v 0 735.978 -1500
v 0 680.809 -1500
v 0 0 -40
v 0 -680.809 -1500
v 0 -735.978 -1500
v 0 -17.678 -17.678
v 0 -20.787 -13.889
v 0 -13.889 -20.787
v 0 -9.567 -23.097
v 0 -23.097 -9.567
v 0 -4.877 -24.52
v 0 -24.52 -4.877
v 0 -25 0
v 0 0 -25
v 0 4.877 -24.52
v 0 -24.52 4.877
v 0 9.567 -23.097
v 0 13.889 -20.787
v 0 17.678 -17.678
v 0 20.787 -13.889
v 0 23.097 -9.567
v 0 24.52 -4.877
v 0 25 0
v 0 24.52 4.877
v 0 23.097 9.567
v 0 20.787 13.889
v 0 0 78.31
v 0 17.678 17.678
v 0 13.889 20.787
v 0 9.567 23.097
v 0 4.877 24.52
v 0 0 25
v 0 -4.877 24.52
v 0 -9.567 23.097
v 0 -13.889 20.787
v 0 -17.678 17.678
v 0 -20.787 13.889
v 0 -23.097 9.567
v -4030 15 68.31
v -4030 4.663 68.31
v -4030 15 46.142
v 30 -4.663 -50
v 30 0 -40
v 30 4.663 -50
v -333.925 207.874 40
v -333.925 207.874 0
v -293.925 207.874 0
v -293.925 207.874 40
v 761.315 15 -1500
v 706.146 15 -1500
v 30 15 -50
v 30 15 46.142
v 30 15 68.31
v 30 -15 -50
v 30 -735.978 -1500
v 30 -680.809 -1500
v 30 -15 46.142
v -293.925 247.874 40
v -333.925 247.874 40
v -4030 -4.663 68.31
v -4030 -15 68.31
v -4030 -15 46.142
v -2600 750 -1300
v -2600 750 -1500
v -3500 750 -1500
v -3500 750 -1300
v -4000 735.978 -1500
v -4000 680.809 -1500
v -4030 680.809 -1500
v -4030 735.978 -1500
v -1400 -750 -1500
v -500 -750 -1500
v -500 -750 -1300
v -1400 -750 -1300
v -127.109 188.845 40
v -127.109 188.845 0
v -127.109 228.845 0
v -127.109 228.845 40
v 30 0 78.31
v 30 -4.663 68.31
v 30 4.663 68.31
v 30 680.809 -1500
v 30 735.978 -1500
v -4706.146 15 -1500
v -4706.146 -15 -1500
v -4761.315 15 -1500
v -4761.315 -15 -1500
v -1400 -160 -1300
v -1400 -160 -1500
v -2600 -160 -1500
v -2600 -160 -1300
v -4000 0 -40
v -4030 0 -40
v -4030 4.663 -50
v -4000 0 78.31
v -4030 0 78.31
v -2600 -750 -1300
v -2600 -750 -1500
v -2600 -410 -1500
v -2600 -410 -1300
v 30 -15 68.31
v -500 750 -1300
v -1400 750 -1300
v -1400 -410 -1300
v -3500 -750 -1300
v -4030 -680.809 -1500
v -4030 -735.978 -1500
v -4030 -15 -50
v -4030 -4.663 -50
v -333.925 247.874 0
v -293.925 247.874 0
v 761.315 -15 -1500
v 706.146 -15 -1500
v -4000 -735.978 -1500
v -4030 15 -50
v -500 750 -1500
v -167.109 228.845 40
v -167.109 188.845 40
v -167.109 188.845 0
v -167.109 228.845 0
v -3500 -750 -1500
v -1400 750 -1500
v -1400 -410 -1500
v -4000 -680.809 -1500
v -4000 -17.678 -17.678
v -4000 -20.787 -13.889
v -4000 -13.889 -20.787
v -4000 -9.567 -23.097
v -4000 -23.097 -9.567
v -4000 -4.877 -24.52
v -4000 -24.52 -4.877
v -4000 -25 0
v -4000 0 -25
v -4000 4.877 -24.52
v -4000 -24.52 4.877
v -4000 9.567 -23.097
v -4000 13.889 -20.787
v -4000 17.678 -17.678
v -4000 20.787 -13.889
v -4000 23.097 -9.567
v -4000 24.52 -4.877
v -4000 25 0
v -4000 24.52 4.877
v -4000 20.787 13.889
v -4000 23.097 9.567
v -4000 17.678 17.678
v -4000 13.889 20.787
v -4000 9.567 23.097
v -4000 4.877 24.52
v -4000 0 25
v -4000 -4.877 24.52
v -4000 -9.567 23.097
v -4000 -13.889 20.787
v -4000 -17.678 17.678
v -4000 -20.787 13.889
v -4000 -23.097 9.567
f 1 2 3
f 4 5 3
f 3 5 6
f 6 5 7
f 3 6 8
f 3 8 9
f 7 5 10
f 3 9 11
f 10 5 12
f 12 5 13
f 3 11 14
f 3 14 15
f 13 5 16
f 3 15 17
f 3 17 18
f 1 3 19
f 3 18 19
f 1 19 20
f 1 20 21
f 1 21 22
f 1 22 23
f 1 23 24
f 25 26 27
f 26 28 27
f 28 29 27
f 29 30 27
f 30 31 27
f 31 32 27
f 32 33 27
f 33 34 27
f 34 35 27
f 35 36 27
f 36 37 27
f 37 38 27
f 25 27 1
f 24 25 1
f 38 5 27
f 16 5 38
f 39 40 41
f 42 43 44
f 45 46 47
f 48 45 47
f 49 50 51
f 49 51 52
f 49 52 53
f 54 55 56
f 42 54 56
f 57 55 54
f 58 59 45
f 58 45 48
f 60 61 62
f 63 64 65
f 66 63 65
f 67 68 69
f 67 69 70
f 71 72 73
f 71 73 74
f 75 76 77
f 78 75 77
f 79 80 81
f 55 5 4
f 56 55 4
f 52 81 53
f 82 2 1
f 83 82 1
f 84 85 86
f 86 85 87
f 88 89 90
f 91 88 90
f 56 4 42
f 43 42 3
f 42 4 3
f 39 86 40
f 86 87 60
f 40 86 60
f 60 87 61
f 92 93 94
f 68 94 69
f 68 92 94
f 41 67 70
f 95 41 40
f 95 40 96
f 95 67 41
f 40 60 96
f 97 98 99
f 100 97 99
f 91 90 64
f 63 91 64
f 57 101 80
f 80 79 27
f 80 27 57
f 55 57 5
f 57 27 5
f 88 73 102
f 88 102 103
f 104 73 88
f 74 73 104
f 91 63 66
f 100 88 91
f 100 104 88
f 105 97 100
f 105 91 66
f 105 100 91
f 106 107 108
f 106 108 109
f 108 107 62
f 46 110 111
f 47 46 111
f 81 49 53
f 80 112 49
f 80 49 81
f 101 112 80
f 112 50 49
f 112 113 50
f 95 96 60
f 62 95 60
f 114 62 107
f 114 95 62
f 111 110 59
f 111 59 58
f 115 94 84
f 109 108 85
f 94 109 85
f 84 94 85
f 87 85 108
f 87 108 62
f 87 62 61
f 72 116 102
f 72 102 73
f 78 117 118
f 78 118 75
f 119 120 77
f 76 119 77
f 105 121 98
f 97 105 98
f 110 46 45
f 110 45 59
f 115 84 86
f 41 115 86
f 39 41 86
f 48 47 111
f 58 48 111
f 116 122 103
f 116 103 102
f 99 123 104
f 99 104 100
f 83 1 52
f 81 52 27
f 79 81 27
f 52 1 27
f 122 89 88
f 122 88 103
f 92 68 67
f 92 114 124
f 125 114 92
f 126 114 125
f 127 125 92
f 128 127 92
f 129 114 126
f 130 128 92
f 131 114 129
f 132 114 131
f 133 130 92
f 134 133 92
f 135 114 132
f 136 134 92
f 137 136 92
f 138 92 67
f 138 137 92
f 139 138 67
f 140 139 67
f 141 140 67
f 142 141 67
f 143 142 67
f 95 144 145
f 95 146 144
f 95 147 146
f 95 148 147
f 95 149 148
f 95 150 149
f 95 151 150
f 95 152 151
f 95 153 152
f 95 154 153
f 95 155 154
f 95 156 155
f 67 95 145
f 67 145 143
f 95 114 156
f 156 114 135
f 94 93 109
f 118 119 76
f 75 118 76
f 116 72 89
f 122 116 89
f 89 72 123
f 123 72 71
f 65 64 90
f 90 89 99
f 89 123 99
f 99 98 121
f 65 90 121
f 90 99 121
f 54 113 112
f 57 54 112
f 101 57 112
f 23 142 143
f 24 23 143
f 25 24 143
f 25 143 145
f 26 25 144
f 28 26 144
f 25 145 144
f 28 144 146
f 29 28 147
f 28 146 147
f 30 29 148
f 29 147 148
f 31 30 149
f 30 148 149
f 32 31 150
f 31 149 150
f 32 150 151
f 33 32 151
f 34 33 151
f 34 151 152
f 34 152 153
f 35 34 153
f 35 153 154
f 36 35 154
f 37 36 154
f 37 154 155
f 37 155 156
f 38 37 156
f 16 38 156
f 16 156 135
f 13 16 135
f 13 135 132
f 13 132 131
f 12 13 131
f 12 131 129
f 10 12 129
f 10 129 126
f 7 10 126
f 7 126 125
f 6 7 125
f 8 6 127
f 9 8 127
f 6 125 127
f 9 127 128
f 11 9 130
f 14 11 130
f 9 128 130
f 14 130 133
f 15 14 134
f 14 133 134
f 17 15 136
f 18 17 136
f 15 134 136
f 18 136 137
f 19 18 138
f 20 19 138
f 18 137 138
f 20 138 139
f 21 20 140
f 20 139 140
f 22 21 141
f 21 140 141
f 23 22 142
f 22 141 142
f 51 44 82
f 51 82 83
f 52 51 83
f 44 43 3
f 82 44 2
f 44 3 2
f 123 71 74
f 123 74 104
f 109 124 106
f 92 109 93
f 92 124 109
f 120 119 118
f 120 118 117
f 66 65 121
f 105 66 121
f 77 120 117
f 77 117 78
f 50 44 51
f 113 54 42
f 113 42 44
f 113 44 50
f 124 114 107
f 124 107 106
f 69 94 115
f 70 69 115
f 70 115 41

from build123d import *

# Parameters (mm, degrees)
F0_R      = 25
F1_DEPTH  = 2000
F3_DEPTH  = 30
F5_DEPTH  = 15
F6_W      = 600
F6_H      = 250
F7_DEPTH  = 200
F9_W      = 40
F9_H      = 40
F10_DEPTH = 40
F11_W     = 40
F11_H     = 40
F12_DEPTH = 40


with BuildPart() as f1:
    # F0 (on Right) → F1 (new body)
    with BuildSketch(Plane.YZ):
        Circle(F0_R)
    extrude(amount=-F1_DEPTH)

    # F2 (on face) → F3 (join)
    with BuildSketch(Plane.YZ):
        Polygon((-680.8091809063, -1500), (0, -40), (0, 78.3100791576), (-735.9780768544, -1500), align=None)
        Polygon((0, 78.3100791576), (0, -40), (680.8091809063, -1500), (735.9780768544, -1500), align=None)
    extrude(amount=F3_DEPTH)

    # F4 (on Front) → F5 (join, symmetric)
    with BuildSketch(Plane.XZ):
        Polygon((761.3150002729, -1500), (30, 68.3100791576), (30, -50), (706.1461043247, -1500), align=None)
    extrude(amount=F5_DEPTH, both=True)



with BuildPart() as f7:
    # F6 (on face) → F7 (new body)
    with BuildSketch(Plane(origin=(0, 0, -1500), x_dir=(1, 0, 0), z_dir=(0, 0, -1))):
        Polygon((-500, -750), (-500, 750), (-1400, 750), (-1400, 410), (-1400, 160), (-1400, -750), align=None)
        with Locations((-1700, 285)):
            Rectangle(F6_W, F6_H)
    extrude(amount=-F7_DEPTH)


with BuildPart() as f1_1:
    add(f1.part)

    add(f7.part)  # F8 merges F7
    # F8: F1, F7 across face
    add(f1.part.mirror(Plane(origin=(-2000, 0, 0), x_dir=(0, 1, 0), z_dir=(-1, 0, 0))))
    add(f7.part.mirror(Plane(origin=(-2000, 0, 0), x_dir=(0, 1, 0), z_dir=(-1, 0, 0))))


with BuildPart() as f10:
    # F9 (on Top) → F10 (new body)
    with BuildSketch(Plane.XY):
        with Locations((-147.1087823877, 208.8453769684)):
            Rectangle(F9_W, F9_H)
    extrude(amount=F10_DEPTH)


with BuildPart() as f12:
    # F11 (on Top) → F12 (new body)
    with BuildSketch(Plane.XY):
        with Locations((-313.9248212089, 227.8739213943)):
            Rectangle(F11_W, F11_H)
    extrude(amount=F12_DEPTH)


solid = Compound([f1_1.part, f10.part, f12.part])
